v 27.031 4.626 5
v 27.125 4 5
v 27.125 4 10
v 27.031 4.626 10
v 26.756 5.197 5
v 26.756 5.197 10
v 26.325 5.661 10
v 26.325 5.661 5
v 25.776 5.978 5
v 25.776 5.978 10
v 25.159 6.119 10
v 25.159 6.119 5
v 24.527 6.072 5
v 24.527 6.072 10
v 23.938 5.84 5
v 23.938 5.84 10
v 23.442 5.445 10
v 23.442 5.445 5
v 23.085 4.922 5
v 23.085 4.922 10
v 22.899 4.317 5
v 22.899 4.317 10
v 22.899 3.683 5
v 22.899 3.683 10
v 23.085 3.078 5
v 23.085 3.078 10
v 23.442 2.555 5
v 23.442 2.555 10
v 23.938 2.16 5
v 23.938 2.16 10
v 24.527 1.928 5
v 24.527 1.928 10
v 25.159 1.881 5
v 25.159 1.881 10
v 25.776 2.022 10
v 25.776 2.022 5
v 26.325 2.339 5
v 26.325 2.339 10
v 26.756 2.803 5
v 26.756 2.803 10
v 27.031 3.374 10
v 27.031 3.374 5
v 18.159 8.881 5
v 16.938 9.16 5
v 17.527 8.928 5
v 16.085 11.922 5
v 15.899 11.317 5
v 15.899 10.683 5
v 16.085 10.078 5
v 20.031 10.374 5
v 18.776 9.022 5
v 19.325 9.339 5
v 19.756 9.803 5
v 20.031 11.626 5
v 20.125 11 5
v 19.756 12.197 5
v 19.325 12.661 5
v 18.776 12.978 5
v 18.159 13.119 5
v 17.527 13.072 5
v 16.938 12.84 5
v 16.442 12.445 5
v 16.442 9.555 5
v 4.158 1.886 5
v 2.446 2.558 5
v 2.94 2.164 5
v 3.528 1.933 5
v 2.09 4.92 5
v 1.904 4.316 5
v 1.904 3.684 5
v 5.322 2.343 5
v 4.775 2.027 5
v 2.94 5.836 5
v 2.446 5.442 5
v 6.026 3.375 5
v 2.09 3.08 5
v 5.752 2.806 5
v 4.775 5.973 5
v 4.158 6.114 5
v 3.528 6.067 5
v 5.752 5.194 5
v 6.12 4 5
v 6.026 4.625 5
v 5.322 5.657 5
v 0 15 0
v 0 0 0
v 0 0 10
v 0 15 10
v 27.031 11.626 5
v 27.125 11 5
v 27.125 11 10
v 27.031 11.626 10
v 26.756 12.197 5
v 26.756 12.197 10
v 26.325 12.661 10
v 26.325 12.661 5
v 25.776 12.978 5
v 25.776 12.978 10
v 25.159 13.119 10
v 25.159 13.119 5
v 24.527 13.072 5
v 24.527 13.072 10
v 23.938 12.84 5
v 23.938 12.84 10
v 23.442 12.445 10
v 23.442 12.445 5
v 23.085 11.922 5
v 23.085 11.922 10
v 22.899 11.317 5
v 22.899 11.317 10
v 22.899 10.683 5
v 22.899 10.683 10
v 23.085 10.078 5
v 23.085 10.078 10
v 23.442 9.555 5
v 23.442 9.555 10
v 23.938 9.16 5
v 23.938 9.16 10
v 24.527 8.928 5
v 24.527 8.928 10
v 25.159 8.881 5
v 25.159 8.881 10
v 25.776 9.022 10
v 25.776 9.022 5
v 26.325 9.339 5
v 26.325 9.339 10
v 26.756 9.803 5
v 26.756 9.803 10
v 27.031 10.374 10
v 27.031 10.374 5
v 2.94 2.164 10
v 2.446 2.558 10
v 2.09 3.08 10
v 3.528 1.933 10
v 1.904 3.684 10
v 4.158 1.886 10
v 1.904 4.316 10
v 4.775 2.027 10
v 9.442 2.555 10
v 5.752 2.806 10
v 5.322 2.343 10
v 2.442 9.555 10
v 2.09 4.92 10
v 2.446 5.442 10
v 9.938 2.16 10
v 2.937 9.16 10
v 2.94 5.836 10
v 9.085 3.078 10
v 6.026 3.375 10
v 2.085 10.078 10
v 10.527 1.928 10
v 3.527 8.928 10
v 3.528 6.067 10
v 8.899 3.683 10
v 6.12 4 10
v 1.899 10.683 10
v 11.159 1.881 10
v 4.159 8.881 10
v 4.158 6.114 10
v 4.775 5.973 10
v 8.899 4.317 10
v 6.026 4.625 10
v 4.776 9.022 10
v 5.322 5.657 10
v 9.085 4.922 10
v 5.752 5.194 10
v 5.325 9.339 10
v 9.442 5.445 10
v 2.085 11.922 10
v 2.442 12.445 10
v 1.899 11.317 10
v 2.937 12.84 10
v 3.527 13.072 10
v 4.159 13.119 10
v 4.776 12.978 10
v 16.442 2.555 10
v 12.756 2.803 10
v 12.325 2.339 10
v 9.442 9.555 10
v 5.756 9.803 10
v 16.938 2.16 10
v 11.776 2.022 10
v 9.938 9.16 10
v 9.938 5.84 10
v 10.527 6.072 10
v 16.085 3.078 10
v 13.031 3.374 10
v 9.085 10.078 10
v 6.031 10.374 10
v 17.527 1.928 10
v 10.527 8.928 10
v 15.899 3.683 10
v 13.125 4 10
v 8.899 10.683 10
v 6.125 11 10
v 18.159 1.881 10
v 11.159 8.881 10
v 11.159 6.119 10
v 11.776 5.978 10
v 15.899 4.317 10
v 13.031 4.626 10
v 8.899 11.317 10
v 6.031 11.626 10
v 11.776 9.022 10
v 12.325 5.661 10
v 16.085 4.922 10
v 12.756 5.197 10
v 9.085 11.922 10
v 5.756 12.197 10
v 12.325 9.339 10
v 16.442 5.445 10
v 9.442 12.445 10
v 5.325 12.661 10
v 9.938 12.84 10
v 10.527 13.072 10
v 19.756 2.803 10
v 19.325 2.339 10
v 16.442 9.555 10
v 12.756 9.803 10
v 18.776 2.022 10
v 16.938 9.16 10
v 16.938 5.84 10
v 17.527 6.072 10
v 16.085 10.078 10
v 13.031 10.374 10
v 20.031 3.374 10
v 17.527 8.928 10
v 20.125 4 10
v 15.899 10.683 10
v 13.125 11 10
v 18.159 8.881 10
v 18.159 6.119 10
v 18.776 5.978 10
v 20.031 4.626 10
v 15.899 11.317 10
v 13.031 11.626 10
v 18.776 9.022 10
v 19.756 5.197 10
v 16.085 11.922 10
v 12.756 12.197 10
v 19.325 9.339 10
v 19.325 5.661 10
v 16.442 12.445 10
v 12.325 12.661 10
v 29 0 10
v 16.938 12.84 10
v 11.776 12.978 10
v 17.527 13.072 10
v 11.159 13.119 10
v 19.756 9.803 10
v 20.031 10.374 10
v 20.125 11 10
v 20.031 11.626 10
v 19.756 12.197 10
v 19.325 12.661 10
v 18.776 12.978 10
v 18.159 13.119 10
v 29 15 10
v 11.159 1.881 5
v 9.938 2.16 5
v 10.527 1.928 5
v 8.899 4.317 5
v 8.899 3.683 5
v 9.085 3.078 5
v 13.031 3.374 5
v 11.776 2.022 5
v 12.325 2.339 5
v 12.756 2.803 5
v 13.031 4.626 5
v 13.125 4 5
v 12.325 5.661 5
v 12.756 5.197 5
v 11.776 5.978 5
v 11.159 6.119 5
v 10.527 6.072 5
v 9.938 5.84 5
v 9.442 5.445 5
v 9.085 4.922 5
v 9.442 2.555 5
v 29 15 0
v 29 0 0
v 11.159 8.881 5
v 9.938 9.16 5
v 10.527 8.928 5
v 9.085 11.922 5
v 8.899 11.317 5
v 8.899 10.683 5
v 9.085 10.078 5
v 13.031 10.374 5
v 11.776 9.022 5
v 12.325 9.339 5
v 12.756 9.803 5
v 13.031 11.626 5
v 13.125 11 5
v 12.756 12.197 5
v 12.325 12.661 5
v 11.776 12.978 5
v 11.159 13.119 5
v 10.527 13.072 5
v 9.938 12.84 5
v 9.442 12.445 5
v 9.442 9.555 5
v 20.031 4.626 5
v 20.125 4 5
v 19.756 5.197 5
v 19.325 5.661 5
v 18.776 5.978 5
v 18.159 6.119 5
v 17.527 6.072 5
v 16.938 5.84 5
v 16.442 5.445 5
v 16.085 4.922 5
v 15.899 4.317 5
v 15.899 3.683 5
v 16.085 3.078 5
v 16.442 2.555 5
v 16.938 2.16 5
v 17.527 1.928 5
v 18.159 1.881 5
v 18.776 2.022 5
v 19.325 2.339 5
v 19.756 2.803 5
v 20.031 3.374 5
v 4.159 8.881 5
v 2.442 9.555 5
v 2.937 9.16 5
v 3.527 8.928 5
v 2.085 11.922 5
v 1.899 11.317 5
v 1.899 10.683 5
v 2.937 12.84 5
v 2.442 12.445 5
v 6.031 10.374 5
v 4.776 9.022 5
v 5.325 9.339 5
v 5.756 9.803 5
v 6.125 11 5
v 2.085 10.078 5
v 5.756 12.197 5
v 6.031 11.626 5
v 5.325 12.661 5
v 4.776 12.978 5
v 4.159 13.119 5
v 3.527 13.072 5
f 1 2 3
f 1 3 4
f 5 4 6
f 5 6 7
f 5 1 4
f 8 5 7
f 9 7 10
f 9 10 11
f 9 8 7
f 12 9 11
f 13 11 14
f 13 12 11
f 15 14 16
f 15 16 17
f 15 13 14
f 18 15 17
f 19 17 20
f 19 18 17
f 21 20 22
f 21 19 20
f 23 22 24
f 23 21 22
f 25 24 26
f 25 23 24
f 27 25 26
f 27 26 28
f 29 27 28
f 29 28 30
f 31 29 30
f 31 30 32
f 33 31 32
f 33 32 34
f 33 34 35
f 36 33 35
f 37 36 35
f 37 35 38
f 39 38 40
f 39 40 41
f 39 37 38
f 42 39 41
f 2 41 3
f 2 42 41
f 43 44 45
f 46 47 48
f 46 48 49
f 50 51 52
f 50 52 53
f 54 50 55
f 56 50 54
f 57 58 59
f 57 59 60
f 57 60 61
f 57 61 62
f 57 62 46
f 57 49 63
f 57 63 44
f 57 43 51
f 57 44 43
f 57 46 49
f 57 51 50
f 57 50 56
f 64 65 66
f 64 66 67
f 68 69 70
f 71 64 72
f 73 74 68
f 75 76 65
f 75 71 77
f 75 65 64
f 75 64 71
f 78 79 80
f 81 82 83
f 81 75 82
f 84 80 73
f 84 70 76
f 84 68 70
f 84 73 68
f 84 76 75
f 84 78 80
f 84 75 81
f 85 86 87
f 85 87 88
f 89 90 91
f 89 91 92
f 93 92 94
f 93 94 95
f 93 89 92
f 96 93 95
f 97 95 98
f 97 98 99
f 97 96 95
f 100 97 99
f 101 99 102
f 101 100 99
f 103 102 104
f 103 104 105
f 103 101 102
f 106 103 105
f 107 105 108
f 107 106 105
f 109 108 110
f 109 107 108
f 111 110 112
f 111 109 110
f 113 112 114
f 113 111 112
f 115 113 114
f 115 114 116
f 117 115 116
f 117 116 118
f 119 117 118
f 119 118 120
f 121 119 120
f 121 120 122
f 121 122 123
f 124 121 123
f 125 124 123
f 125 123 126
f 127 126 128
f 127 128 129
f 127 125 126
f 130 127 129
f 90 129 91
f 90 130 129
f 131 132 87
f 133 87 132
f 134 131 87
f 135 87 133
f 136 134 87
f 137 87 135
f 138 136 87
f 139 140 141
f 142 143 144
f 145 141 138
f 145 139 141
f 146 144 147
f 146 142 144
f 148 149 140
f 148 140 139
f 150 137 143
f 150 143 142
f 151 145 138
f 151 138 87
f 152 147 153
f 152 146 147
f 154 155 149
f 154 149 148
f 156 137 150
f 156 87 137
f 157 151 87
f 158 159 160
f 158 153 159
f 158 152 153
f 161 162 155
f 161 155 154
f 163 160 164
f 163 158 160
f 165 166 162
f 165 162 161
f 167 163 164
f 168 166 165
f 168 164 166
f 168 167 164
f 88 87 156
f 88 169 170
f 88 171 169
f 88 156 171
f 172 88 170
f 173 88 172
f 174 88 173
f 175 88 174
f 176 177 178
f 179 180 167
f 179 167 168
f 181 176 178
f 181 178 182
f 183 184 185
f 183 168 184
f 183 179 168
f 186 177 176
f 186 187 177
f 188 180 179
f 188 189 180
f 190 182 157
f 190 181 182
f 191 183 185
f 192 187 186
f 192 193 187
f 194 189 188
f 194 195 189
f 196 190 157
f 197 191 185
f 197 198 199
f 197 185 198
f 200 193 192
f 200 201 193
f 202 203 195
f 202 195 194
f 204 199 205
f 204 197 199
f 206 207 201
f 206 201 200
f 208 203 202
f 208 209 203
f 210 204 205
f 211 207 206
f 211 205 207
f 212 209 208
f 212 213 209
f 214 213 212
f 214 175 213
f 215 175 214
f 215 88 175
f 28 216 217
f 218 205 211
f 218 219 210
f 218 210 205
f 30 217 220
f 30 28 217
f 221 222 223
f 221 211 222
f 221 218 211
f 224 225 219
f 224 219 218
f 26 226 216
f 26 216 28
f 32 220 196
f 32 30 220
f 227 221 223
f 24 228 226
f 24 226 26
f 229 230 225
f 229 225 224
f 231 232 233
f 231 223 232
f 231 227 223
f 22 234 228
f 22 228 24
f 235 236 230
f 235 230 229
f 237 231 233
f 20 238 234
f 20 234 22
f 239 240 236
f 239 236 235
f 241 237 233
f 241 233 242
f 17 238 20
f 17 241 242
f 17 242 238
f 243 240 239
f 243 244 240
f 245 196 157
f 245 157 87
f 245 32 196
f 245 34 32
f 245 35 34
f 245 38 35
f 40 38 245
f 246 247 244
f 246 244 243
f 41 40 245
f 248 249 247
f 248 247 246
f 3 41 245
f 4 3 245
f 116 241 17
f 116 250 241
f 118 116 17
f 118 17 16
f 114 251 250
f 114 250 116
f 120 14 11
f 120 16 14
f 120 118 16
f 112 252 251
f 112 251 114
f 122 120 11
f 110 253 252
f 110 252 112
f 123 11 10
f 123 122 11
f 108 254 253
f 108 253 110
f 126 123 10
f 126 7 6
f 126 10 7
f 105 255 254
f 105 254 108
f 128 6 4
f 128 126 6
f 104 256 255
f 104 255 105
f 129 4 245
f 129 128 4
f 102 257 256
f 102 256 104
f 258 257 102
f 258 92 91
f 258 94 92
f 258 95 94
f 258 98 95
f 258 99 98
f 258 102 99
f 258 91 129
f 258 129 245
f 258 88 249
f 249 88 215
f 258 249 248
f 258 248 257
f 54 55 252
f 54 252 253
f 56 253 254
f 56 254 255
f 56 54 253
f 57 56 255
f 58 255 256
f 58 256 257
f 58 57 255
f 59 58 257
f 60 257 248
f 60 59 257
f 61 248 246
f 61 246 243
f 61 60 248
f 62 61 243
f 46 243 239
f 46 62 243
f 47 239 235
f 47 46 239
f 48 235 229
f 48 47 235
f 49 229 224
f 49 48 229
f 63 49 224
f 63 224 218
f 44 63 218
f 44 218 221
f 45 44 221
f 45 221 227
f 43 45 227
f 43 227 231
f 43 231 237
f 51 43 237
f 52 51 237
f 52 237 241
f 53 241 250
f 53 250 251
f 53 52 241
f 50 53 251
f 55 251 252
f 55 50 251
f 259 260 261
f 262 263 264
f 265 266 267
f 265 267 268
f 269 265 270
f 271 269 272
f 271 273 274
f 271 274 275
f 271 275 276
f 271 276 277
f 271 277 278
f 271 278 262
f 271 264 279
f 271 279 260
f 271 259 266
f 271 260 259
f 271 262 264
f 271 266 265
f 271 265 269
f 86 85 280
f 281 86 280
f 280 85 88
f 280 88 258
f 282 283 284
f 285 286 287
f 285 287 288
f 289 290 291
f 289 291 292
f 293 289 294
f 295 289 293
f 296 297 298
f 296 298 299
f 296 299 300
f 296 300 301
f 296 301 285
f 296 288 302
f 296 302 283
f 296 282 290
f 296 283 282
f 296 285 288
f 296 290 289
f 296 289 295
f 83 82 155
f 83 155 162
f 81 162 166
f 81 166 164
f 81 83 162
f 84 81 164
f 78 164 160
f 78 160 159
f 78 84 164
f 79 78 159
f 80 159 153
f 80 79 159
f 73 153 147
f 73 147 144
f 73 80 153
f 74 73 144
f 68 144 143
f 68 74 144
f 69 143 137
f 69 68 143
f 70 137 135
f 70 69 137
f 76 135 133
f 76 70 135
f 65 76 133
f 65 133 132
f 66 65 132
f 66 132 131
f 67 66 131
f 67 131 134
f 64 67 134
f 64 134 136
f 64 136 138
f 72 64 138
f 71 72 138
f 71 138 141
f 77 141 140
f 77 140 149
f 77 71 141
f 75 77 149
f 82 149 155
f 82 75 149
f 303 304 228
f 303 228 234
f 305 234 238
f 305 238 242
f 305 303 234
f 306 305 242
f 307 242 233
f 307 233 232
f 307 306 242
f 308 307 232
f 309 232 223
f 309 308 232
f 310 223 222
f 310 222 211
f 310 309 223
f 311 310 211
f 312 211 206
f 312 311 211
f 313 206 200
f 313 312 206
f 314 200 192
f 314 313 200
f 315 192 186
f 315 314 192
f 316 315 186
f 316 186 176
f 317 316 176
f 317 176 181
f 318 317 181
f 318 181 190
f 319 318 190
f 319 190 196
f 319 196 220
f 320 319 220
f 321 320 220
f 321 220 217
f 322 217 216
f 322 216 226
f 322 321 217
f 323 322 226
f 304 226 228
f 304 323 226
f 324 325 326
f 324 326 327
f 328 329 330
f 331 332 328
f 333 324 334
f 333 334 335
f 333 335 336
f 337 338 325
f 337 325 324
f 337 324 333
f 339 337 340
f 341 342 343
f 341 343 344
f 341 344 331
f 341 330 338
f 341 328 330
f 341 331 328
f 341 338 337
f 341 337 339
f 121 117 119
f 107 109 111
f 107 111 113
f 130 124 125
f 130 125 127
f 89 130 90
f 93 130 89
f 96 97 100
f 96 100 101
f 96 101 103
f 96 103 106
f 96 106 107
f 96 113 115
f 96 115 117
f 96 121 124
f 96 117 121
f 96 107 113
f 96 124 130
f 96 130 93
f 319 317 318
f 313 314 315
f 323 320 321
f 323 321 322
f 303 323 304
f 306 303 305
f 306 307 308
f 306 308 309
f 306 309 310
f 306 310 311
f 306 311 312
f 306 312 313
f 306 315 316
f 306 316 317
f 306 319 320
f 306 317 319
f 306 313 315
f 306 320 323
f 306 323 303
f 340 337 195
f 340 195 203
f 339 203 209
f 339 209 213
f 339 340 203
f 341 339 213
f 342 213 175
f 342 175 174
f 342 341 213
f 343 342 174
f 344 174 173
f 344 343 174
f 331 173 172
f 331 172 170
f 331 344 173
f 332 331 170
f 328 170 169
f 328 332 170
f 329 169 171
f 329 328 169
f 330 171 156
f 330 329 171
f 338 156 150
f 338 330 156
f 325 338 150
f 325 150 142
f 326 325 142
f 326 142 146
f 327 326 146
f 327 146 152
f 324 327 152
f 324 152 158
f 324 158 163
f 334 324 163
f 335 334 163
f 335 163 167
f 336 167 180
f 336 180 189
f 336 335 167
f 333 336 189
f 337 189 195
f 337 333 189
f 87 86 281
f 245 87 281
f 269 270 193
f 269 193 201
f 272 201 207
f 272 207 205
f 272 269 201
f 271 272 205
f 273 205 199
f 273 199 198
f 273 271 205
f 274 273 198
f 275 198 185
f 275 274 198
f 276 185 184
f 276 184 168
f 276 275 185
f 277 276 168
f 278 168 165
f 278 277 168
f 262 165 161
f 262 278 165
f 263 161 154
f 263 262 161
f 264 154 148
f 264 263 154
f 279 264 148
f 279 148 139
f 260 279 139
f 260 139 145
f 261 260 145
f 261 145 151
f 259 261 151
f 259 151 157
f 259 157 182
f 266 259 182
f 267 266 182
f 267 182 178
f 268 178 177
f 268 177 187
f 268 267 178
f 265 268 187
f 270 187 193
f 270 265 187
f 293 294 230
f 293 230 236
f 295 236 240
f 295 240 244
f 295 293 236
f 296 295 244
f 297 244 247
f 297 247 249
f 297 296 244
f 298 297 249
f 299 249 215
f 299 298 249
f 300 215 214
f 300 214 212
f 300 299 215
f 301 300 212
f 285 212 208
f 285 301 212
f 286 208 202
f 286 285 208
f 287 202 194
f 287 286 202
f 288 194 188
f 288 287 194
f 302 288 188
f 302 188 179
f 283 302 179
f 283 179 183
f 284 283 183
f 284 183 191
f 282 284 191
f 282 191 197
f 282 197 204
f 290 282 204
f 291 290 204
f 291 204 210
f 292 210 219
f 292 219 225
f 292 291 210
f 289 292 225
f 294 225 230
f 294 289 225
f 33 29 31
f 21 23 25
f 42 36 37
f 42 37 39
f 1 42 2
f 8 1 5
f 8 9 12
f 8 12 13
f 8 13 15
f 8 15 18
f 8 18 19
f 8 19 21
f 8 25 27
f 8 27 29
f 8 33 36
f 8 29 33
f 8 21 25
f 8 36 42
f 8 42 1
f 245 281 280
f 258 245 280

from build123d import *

# Parameters (mm, degrees)
CYLINDER003_R     = 2.125
CYLINDER003_DEPTH = 5
CYLINDER005_R     = 2.125
CYLINDER005_DEPTH = 5
CYLINDER004_R     = 2.125
CYLINDER004_DEPTH = 5
CYLINDER002_R     = 2.125
CYLINDER002_DEPTH = 5
CYLINDER001_R     = 2.125
CYLINDER001_DEPTH = 5
CYLINDER006_R     = 2.125
CYLINDER006_DEPTH = 5
CYLINDER007_R     = 2.125
CYLINDER007_DEPTH = 5
CYLINDER_R        = 2.12
CYLINDER_DEPTH    = 5
BOX_W             = 29
BOX_H             = 15
BOX_DEPTH         = 10


with BuildPart() as cylinder003:
    # Cylinder003 → Cylinder003 (new body)
    with BuildSketch(Plane(origin=(4, 11, 5), x_dir=(1, 0, 0), z_dir=(0, 0, 1))):
        Circle(CYLINDER003_R)
    extrude(amount=CYLINDER003_DEPTH)


with BuildPart() as cylinder005:
    # Cylinder005 → Cylinder005 (new body)
    with BuildSketch(Plane(origin=(25, 4, 5), x_dir=(1, 0, 0), z_dir=(0, 0, 1))):
        Circle(CYLINDER005_R)
    extrude(amount=CYLINDER005_DEPTH)


with BuildPart() as cylinder004:
    # Cylinder004 → Cylinder004 (new body)
    with BuildSketch(Plane(origin=(18, 11, 5), x_dir=(1, 0, 0), z_dir=(0, 0, 1))):
        Circle(CYLINDER004_R)
    extrude(amount=CYLINDER004_DEPTH)


with BuildPart() as cylinder002:
    # Cylinder002 → Cylinder002 (new body)
    with BuildSketch(Plane(origin=(11, 11, 5), x_dir=(1, 0, 0), z_dir=(0, 0, 1))):
        Circle(CYLINDER002_R)
    extrude(amount=CYLINDER002_DEPTH)


with BuildPart() as cylinder001:
    # Cylinder001 → Cylinder001 (new body)
    with BuildSketch(Plane(origin=(11, 4, 5), x_dir=(1, 0, 0), z_dir=(0, 0, 1))):
        Circle(CYLINDER001_R)
    extrude(amount=CYLINDER001_DEPTH)


with BuildPart() as cylinder006:
    # Cylinder006 → Cylinder006 (new body)
    with BuildSketch(Plane(origin=(18, 4, 5), x_dir=(1, 0, 0), z_dir=(0, 0, 1))):
        Circle(CYLINDER006_R)
    extrude(amount=CYLINDER006_DEPTH)


with BuildPart() as cylinder007:
    # Cylinder007 → Cylinder007 (new body)
    with BuildSketch(Plane(origin=(25, 11, 5), x_dir=(1, 0, 0), z_dir=(0, 0, 1))):
        Circle(CYLINDER007_R)
    extrude(amount=CYLINDER007_DEPTH)


with BuildPart() as fusion:
    # Cylinder → Cylinder (new body)
    with BuildSketch(Plane(origin=(4, 4, 5), x_dir=(1, 0, 0), z_dir=(0, 0, 1))):
        Circle(CYLINDER_R)
    extrude(amount=CYLINDER_DEPTH)

    # Fusion: union Cylinder003, Cylinder005, Cylinder004, Cylinder002, Cylinder001, Cylinder006, Cylinder007
    add(cylinder003.part)
    add(cylinder005.part)
    add(cylinder004.part)
    add(cylinder002.part)
    add(cylinder001.part)
    add(cylinder006.part)
    add(cylinder007.part)


with BuildPart() as cut:
    # Box → Box (new body)
    with BuildSketch(Plane.XY):
        with Locations((14.5, 7.5)):
            Rectangle(BOX_W, BOX_H)
    extrude(amount=BOX_DEPTH)

    # Cut: cut Fusion
    add(fusion.part, mode=Mode.SUBTRACT)


solid = cut.part
